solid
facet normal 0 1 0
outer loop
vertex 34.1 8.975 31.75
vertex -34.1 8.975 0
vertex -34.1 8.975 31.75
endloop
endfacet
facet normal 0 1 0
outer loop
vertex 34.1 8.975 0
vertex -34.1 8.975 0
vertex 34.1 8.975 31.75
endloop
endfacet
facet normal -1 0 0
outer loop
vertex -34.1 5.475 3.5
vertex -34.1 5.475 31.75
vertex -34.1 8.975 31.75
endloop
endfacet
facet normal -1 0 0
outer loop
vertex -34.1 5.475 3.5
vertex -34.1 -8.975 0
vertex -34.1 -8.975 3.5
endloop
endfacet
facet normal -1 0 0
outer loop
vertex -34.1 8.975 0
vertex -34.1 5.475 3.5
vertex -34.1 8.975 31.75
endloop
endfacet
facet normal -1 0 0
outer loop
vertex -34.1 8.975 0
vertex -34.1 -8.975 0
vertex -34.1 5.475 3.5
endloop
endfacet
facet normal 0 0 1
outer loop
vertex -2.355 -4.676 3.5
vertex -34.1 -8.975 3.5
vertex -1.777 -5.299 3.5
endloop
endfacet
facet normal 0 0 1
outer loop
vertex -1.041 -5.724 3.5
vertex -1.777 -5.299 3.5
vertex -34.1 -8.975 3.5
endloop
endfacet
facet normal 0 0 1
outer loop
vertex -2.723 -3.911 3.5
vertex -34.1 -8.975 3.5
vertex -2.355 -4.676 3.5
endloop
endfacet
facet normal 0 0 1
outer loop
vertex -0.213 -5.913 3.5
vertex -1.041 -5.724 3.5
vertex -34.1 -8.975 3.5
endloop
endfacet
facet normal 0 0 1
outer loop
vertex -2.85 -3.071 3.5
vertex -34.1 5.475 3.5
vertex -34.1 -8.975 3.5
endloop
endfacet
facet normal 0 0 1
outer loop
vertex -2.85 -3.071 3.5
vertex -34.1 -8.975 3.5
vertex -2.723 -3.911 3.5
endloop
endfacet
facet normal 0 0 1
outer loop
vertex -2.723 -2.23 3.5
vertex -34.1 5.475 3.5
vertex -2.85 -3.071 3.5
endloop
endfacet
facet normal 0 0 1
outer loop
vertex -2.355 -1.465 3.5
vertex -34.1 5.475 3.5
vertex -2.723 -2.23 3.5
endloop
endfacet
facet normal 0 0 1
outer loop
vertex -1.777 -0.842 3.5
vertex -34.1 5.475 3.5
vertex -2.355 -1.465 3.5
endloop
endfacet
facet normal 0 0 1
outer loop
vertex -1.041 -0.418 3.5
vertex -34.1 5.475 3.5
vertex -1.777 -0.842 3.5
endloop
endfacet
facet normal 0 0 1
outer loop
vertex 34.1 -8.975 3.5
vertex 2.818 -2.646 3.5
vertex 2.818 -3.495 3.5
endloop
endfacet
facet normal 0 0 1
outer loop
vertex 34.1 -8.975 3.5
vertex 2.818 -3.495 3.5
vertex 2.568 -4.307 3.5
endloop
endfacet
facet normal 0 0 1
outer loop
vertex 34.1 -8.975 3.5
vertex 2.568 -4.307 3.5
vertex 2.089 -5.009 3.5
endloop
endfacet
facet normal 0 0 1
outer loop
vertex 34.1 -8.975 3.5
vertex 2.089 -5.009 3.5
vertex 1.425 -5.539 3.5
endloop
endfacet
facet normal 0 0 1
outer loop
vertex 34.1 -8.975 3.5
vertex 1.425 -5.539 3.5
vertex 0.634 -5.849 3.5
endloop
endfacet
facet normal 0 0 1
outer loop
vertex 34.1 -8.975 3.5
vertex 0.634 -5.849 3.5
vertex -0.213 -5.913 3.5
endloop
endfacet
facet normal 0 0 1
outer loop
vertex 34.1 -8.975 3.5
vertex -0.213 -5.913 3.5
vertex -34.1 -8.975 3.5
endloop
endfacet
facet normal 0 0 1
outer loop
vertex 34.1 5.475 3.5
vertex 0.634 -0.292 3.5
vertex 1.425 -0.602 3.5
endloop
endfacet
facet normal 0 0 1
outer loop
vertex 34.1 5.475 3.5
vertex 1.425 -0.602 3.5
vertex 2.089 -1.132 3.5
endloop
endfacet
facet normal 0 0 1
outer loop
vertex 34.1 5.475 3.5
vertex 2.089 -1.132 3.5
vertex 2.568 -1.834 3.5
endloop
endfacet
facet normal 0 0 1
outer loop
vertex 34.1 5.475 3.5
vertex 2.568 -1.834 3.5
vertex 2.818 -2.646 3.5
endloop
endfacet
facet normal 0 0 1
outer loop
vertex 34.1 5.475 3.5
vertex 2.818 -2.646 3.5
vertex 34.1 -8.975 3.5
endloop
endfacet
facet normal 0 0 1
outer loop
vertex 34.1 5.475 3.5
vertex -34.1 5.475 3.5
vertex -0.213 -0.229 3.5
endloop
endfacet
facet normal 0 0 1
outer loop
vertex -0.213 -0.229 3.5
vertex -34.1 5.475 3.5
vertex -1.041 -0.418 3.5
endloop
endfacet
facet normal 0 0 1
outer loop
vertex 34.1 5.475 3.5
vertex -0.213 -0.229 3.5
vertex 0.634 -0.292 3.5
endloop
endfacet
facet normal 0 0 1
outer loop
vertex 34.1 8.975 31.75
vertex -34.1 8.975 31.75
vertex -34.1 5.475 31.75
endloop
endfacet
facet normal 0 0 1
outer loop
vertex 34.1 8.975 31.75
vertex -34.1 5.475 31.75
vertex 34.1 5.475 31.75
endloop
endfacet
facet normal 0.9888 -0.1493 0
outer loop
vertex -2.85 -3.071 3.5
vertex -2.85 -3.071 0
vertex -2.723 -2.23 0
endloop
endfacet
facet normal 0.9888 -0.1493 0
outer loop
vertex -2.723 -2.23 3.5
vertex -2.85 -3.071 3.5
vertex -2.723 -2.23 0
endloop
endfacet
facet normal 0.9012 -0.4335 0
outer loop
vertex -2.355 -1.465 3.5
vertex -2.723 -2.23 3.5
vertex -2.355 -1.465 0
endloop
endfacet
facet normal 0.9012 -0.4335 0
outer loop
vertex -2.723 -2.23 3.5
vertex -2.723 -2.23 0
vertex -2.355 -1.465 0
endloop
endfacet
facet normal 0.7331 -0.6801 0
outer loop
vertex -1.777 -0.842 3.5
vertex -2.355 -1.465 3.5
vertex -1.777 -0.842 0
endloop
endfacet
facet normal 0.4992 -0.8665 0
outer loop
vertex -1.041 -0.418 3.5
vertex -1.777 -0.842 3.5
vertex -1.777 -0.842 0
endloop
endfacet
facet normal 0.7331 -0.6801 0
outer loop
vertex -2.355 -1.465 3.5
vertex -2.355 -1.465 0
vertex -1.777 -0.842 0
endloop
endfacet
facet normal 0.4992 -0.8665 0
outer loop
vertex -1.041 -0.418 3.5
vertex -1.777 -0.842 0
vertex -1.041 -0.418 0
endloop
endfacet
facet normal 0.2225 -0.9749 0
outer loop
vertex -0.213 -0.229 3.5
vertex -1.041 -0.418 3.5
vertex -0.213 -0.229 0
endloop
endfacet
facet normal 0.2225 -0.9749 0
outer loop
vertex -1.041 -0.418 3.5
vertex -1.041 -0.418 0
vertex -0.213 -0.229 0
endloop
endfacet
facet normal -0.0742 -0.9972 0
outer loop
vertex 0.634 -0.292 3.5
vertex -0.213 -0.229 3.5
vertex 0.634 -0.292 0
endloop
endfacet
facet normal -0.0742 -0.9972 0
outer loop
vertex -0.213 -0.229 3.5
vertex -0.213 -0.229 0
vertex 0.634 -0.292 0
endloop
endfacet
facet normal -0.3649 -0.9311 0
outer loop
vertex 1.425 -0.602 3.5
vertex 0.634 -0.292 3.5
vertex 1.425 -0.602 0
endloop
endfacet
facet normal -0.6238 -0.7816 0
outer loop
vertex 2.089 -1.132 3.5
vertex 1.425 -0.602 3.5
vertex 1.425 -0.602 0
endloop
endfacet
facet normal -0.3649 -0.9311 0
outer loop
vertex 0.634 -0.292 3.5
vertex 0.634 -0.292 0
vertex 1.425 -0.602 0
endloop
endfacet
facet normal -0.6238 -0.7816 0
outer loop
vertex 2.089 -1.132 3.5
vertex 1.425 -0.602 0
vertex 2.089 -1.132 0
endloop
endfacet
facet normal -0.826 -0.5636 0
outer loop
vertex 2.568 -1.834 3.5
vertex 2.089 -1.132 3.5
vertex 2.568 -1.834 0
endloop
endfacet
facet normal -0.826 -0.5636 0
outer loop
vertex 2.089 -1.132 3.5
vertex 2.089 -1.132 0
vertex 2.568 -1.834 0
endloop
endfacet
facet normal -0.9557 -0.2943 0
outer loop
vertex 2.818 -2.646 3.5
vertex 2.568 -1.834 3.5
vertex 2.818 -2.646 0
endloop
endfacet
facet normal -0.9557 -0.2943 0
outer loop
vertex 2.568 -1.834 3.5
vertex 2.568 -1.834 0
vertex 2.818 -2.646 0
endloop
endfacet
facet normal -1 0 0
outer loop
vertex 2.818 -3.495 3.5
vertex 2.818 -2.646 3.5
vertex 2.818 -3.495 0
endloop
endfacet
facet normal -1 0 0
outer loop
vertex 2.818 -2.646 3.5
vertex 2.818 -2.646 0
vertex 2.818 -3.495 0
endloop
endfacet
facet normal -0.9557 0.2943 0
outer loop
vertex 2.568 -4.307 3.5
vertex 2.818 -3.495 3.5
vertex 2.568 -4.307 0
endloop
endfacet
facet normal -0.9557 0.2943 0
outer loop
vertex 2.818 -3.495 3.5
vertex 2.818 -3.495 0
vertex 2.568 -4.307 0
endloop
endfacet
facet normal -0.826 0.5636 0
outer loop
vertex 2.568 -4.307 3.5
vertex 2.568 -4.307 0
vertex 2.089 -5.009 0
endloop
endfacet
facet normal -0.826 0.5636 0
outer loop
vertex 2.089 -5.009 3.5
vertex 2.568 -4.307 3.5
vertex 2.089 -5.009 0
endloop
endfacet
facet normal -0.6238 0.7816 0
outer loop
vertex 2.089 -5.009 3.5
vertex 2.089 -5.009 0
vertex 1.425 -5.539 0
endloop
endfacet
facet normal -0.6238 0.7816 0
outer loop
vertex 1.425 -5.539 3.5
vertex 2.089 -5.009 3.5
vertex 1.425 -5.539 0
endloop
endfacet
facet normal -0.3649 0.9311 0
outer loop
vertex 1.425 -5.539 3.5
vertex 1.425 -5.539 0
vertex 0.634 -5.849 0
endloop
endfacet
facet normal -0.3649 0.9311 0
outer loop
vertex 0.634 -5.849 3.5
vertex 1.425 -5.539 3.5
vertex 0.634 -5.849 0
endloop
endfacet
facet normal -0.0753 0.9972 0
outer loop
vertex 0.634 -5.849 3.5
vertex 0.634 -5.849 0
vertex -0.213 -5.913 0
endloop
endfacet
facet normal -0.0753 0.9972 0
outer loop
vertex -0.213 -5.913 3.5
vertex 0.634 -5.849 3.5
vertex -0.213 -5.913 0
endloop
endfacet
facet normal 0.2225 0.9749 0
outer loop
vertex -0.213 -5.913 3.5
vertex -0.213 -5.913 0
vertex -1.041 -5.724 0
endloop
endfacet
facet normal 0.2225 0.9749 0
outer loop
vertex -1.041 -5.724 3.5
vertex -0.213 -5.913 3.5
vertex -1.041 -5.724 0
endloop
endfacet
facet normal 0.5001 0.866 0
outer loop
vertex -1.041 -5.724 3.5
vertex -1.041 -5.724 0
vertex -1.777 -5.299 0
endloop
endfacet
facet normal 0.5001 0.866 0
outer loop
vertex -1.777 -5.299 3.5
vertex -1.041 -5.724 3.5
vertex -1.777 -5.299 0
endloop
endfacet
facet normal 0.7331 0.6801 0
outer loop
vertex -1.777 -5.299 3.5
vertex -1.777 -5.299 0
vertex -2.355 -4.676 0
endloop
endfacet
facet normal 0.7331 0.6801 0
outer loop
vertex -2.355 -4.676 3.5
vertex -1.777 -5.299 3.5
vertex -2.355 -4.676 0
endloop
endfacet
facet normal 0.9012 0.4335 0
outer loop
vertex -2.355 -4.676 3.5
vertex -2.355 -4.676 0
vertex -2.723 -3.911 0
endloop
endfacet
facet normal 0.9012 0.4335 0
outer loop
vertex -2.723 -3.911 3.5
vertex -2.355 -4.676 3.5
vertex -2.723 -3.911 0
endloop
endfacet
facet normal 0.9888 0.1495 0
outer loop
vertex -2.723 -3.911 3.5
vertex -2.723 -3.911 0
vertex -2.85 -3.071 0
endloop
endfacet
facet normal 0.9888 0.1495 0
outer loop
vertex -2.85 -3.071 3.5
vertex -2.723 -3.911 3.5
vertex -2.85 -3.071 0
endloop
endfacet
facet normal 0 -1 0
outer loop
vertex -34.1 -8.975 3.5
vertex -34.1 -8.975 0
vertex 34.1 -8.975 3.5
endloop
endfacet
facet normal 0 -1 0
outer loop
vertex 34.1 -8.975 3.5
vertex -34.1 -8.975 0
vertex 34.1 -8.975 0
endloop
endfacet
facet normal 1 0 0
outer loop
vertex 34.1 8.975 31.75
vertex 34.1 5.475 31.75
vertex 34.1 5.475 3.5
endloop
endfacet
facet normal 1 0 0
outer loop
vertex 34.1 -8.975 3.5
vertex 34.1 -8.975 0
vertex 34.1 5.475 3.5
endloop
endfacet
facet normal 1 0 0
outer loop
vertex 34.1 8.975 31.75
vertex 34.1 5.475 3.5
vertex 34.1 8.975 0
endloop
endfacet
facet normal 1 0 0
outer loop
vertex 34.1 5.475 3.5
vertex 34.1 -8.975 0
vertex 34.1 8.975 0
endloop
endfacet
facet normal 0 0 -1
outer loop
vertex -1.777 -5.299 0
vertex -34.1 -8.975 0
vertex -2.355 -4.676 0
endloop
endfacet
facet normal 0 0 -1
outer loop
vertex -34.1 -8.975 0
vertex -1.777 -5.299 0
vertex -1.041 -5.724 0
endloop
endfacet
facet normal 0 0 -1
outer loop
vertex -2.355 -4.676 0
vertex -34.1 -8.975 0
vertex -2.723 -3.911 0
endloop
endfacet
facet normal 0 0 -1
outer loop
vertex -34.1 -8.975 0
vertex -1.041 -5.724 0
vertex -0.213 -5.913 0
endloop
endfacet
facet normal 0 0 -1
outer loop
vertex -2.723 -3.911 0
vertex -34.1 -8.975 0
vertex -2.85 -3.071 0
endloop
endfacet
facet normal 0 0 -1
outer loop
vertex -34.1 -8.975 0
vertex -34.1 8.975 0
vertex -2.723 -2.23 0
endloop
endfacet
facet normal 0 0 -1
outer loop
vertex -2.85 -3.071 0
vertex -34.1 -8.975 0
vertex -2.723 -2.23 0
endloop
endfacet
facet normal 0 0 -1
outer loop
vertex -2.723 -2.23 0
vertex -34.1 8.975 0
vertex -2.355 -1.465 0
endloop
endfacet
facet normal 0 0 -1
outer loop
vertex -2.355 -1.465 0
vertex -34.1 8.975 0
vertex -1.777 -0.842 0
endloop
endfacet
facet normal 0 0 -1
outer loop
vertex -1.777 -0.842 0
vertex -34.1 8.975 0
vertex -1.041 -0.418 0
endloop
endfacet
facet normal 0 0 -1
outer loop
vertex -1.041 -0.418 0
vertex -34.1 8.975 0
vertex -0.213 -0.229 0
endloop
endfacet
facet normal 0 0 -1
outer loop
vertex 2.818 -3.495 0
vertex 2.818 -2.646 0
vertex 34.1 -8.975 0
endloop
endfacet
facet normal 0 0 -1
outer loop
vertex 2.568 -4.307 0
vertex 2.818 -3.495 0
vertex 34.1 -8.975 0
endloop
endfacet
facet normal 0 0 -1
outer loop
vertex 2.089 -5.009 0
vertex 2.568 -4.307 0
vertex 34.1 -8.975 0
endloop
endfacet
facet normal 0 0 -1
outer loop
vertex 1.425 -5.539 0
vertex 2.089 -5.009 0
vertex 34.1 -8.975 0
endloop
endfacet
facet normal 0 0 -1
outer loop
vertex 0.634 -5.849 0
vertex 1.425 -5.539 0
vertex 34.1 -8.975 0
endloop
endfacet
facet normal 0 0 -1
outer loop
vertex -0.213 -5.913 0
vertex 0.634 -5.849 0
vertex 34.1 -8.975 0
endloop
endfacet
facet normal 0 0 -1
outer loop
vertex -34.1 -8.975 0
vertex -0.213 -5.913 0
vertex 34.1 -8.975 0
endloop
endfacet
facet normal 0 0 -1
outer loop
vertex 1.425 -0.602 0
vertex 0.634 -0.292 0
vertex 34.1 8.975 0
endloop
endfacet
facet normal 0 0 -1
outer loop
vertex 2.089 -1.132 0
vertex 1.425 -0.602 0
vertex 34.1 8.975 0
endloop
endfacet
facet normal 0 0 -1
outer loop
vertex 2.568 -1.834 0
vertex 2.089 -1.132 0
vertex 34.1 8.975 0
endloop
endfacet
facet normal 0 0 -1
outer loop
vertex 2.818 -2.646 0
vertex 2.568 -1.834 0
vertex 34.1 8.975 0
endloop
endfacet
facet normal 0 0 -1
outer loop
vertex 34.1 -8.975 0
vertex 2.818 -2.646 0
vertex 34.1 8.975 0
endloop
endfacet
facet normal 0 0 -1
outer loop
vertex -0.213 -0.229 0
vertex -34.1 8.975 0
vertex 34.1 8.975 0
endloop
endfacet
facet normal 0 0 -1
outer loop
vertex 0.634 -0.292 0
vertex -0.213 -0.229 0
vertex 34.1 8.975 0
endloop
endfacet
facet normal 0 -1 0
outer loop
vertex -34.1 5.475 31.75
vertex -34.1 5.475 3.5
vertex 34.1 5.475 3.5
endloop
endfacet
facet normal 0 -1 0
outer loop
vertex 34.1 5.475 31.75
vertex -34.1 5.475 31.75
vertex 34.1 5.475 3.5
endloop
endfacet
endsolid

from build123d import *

# Parameters (mm, degrees)
SKETCH_1_W          = 68.2
SKETCH_1_H          = 17.95
EXTRUDE_1_DEPTH     = 3.5
SKETCH_21_W         = 68.2
SKETCH_21_H         = 3.5
EXTRUDE_4_DEPTH     = 28.25
SKETCH_24_R         = 2.85
CUT_EXTRUDE_2_DEPTH = 28.25


with BuildPart() as part:
    # 草圖1 → 1 (new body)
    with BuildSketch(Plane.XY):
        Rectangle(SKETCH_1_W, SKETCH_1_H)
    extrude(amount=EXTRUDE_1_DEPTH)

    # 草圖21 → 填料-伸長4 (add)
    with BuildSketch(Plane.XY.offset(3.5)):
        with Locations((0, 7.225)):
            Rectangle(SKETCH_21_W, SKETCH_21_H)
    extrude(amount=EXTRUDE_4_DEPTH)

    # 草圖24 → 除料-伸長2 (cut)
    with BuildSketch(Plane(origin=(0, 0, 0), x_dir=(-1, 0, 0), z_dir=(0, 0, -1))):
        with Locations((0, -3.070533486)):
            Circle(SKETCH_24_R)
    extrude(amount=-CUT_EXTRUDE_2_DEPTH, mode=Mode.SUBTRACT)


solid = part.part
